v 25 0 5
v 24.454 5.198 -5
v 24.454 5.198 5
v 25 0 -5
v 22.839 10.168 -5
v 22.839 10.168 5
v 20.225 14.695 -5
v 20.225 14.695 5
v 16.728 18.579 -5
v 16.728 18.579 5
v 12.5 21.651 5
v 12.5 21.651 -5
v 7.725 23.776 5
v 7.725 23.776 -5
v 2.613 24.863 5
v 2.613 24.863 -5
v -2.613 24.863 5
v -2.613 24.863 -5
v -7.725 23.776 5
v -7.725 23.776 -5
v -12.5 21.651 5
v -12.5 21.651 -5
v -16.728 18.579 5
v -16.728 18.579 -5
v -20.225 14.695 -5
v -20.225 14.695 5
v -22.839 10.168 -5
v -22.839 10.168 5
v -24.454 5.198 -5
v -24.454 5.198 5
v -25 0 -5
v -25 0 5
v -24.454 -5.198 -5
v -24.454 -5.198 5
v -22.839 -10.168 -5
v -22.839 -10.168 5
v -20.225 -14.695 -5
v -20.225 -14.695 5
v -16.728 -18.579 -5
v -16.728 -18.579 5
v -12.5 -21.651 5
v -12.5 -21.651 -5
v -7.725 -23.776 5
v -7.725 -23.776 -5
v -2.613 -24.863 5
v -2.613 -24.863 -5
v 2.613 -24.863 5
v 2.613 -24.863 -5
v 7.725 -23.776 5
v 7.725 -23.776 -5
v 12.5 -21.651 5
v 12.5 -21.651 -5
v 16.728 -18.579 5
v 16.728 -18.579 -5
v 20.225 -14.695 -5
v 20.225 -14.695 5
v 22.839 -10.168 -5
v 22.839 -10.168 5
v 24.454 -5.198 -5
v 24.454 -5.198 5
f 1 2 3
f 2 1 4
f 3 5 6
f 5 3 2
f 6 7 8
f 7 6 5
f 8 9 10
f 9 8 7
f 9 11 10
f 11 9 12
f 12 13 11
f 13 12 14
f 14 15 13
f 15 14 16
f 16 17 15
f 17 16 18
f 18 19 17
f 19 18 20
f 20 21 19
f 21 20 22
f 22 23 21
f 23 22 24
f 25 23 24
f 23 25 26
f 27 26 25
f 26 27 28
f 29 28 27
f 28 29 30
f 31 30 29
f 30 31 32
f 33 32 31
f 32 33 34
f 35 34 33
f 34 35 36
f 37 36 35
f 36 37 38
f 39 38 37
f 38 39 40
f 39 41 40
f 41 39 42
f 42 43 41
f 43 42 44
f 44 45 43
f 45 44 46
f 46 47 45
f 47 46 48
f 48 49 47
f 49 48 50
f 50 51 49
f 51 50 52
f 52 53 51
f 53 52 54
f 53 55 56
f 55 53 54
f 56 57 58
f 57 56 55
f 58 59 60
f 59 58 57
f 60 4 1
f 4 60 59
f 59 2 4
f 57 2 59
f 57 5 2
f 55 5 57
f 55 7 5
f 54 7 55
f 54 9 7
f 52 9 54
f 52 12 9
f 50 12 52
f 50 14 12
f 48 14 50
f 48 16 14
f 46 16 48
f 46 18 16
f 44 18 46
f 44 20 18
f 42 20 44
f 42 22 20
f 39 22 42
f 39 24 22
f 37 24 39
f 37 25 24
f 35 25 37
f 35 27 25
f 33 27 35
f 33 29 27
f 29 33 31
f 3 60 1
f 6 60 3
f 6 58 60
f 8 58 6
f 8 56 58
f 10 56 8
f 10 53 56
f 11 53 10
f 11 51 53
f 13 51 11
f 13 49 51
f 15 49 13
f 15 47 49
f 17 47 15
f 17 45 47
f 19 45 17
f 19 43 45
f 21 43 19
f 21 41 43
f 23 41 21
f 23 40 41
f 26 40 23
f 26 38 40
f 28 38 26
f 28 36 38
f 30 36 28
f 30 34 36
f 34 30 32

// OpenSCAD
// file: parameters.scad
//All parameters

link_gear_r = 25;
link_gear_h = 10;

paddle_gear_r = 20;
paddle_gear_h = 10;

paddle_shaft_r = 5;
paddle_shaft_h = 400;

upper_length_resolution = 8;
hook_w = 5;
hook_t = 2;
hook_gap = 0.1;
shell = 1.5;
groove = 2.5;

paddle_upper_l = 35;
paddle_upper_t = shell*3.2;
paddle_upper_w = 12;

slide_gap = 0.1;
forearm_w = paddle_upper_w-shell*2-slide_gap*2;
wrist_joint_outer = forearm_w/2;
wrist_joint_inner = wrist_joint_outer/3;

forearm_t = paddle_upper_t-shell*2-slide_gap*2;
forearm_l = paddle_upper_l+wrist_joint_outer;

bolt_r = wrist_joint_inner-slide_gap;
bolt_h = forearm_t*2+slide_gap;
bolt_groove = bolt_r*0.4;

head_hook = bolt_groove/2-slide_gap*2;
head_r = bolt_r+head_hook;

clip_l = shell*4+hook_t+slide_gap;
clip_h = shell*2+forearm_t;

thumb_hook_h = shell*2;
thumb_hook_t = shell;
thumb_hook_l = shell*3;
hook_h = shell*2+thumb_hook_h;

pos1 = 1;
pos2 = 0;
wrist_angle = 0;
paddle_upper_declination = 180;
declination_offset = (paddle_upper_w)/(paddle_upper_l*2)*(180/3.1415);

paddle_bar_h = 100;
paddle_bar_r = 10;

paddle_upper_declination = 210;
paddle_gear_elivation = 45;
// main file
include <parameters.scad>;

module link_gear(){
	cylinder(r = link_gear_r, h = link_gear_h, center = true);
}

link_gear();
